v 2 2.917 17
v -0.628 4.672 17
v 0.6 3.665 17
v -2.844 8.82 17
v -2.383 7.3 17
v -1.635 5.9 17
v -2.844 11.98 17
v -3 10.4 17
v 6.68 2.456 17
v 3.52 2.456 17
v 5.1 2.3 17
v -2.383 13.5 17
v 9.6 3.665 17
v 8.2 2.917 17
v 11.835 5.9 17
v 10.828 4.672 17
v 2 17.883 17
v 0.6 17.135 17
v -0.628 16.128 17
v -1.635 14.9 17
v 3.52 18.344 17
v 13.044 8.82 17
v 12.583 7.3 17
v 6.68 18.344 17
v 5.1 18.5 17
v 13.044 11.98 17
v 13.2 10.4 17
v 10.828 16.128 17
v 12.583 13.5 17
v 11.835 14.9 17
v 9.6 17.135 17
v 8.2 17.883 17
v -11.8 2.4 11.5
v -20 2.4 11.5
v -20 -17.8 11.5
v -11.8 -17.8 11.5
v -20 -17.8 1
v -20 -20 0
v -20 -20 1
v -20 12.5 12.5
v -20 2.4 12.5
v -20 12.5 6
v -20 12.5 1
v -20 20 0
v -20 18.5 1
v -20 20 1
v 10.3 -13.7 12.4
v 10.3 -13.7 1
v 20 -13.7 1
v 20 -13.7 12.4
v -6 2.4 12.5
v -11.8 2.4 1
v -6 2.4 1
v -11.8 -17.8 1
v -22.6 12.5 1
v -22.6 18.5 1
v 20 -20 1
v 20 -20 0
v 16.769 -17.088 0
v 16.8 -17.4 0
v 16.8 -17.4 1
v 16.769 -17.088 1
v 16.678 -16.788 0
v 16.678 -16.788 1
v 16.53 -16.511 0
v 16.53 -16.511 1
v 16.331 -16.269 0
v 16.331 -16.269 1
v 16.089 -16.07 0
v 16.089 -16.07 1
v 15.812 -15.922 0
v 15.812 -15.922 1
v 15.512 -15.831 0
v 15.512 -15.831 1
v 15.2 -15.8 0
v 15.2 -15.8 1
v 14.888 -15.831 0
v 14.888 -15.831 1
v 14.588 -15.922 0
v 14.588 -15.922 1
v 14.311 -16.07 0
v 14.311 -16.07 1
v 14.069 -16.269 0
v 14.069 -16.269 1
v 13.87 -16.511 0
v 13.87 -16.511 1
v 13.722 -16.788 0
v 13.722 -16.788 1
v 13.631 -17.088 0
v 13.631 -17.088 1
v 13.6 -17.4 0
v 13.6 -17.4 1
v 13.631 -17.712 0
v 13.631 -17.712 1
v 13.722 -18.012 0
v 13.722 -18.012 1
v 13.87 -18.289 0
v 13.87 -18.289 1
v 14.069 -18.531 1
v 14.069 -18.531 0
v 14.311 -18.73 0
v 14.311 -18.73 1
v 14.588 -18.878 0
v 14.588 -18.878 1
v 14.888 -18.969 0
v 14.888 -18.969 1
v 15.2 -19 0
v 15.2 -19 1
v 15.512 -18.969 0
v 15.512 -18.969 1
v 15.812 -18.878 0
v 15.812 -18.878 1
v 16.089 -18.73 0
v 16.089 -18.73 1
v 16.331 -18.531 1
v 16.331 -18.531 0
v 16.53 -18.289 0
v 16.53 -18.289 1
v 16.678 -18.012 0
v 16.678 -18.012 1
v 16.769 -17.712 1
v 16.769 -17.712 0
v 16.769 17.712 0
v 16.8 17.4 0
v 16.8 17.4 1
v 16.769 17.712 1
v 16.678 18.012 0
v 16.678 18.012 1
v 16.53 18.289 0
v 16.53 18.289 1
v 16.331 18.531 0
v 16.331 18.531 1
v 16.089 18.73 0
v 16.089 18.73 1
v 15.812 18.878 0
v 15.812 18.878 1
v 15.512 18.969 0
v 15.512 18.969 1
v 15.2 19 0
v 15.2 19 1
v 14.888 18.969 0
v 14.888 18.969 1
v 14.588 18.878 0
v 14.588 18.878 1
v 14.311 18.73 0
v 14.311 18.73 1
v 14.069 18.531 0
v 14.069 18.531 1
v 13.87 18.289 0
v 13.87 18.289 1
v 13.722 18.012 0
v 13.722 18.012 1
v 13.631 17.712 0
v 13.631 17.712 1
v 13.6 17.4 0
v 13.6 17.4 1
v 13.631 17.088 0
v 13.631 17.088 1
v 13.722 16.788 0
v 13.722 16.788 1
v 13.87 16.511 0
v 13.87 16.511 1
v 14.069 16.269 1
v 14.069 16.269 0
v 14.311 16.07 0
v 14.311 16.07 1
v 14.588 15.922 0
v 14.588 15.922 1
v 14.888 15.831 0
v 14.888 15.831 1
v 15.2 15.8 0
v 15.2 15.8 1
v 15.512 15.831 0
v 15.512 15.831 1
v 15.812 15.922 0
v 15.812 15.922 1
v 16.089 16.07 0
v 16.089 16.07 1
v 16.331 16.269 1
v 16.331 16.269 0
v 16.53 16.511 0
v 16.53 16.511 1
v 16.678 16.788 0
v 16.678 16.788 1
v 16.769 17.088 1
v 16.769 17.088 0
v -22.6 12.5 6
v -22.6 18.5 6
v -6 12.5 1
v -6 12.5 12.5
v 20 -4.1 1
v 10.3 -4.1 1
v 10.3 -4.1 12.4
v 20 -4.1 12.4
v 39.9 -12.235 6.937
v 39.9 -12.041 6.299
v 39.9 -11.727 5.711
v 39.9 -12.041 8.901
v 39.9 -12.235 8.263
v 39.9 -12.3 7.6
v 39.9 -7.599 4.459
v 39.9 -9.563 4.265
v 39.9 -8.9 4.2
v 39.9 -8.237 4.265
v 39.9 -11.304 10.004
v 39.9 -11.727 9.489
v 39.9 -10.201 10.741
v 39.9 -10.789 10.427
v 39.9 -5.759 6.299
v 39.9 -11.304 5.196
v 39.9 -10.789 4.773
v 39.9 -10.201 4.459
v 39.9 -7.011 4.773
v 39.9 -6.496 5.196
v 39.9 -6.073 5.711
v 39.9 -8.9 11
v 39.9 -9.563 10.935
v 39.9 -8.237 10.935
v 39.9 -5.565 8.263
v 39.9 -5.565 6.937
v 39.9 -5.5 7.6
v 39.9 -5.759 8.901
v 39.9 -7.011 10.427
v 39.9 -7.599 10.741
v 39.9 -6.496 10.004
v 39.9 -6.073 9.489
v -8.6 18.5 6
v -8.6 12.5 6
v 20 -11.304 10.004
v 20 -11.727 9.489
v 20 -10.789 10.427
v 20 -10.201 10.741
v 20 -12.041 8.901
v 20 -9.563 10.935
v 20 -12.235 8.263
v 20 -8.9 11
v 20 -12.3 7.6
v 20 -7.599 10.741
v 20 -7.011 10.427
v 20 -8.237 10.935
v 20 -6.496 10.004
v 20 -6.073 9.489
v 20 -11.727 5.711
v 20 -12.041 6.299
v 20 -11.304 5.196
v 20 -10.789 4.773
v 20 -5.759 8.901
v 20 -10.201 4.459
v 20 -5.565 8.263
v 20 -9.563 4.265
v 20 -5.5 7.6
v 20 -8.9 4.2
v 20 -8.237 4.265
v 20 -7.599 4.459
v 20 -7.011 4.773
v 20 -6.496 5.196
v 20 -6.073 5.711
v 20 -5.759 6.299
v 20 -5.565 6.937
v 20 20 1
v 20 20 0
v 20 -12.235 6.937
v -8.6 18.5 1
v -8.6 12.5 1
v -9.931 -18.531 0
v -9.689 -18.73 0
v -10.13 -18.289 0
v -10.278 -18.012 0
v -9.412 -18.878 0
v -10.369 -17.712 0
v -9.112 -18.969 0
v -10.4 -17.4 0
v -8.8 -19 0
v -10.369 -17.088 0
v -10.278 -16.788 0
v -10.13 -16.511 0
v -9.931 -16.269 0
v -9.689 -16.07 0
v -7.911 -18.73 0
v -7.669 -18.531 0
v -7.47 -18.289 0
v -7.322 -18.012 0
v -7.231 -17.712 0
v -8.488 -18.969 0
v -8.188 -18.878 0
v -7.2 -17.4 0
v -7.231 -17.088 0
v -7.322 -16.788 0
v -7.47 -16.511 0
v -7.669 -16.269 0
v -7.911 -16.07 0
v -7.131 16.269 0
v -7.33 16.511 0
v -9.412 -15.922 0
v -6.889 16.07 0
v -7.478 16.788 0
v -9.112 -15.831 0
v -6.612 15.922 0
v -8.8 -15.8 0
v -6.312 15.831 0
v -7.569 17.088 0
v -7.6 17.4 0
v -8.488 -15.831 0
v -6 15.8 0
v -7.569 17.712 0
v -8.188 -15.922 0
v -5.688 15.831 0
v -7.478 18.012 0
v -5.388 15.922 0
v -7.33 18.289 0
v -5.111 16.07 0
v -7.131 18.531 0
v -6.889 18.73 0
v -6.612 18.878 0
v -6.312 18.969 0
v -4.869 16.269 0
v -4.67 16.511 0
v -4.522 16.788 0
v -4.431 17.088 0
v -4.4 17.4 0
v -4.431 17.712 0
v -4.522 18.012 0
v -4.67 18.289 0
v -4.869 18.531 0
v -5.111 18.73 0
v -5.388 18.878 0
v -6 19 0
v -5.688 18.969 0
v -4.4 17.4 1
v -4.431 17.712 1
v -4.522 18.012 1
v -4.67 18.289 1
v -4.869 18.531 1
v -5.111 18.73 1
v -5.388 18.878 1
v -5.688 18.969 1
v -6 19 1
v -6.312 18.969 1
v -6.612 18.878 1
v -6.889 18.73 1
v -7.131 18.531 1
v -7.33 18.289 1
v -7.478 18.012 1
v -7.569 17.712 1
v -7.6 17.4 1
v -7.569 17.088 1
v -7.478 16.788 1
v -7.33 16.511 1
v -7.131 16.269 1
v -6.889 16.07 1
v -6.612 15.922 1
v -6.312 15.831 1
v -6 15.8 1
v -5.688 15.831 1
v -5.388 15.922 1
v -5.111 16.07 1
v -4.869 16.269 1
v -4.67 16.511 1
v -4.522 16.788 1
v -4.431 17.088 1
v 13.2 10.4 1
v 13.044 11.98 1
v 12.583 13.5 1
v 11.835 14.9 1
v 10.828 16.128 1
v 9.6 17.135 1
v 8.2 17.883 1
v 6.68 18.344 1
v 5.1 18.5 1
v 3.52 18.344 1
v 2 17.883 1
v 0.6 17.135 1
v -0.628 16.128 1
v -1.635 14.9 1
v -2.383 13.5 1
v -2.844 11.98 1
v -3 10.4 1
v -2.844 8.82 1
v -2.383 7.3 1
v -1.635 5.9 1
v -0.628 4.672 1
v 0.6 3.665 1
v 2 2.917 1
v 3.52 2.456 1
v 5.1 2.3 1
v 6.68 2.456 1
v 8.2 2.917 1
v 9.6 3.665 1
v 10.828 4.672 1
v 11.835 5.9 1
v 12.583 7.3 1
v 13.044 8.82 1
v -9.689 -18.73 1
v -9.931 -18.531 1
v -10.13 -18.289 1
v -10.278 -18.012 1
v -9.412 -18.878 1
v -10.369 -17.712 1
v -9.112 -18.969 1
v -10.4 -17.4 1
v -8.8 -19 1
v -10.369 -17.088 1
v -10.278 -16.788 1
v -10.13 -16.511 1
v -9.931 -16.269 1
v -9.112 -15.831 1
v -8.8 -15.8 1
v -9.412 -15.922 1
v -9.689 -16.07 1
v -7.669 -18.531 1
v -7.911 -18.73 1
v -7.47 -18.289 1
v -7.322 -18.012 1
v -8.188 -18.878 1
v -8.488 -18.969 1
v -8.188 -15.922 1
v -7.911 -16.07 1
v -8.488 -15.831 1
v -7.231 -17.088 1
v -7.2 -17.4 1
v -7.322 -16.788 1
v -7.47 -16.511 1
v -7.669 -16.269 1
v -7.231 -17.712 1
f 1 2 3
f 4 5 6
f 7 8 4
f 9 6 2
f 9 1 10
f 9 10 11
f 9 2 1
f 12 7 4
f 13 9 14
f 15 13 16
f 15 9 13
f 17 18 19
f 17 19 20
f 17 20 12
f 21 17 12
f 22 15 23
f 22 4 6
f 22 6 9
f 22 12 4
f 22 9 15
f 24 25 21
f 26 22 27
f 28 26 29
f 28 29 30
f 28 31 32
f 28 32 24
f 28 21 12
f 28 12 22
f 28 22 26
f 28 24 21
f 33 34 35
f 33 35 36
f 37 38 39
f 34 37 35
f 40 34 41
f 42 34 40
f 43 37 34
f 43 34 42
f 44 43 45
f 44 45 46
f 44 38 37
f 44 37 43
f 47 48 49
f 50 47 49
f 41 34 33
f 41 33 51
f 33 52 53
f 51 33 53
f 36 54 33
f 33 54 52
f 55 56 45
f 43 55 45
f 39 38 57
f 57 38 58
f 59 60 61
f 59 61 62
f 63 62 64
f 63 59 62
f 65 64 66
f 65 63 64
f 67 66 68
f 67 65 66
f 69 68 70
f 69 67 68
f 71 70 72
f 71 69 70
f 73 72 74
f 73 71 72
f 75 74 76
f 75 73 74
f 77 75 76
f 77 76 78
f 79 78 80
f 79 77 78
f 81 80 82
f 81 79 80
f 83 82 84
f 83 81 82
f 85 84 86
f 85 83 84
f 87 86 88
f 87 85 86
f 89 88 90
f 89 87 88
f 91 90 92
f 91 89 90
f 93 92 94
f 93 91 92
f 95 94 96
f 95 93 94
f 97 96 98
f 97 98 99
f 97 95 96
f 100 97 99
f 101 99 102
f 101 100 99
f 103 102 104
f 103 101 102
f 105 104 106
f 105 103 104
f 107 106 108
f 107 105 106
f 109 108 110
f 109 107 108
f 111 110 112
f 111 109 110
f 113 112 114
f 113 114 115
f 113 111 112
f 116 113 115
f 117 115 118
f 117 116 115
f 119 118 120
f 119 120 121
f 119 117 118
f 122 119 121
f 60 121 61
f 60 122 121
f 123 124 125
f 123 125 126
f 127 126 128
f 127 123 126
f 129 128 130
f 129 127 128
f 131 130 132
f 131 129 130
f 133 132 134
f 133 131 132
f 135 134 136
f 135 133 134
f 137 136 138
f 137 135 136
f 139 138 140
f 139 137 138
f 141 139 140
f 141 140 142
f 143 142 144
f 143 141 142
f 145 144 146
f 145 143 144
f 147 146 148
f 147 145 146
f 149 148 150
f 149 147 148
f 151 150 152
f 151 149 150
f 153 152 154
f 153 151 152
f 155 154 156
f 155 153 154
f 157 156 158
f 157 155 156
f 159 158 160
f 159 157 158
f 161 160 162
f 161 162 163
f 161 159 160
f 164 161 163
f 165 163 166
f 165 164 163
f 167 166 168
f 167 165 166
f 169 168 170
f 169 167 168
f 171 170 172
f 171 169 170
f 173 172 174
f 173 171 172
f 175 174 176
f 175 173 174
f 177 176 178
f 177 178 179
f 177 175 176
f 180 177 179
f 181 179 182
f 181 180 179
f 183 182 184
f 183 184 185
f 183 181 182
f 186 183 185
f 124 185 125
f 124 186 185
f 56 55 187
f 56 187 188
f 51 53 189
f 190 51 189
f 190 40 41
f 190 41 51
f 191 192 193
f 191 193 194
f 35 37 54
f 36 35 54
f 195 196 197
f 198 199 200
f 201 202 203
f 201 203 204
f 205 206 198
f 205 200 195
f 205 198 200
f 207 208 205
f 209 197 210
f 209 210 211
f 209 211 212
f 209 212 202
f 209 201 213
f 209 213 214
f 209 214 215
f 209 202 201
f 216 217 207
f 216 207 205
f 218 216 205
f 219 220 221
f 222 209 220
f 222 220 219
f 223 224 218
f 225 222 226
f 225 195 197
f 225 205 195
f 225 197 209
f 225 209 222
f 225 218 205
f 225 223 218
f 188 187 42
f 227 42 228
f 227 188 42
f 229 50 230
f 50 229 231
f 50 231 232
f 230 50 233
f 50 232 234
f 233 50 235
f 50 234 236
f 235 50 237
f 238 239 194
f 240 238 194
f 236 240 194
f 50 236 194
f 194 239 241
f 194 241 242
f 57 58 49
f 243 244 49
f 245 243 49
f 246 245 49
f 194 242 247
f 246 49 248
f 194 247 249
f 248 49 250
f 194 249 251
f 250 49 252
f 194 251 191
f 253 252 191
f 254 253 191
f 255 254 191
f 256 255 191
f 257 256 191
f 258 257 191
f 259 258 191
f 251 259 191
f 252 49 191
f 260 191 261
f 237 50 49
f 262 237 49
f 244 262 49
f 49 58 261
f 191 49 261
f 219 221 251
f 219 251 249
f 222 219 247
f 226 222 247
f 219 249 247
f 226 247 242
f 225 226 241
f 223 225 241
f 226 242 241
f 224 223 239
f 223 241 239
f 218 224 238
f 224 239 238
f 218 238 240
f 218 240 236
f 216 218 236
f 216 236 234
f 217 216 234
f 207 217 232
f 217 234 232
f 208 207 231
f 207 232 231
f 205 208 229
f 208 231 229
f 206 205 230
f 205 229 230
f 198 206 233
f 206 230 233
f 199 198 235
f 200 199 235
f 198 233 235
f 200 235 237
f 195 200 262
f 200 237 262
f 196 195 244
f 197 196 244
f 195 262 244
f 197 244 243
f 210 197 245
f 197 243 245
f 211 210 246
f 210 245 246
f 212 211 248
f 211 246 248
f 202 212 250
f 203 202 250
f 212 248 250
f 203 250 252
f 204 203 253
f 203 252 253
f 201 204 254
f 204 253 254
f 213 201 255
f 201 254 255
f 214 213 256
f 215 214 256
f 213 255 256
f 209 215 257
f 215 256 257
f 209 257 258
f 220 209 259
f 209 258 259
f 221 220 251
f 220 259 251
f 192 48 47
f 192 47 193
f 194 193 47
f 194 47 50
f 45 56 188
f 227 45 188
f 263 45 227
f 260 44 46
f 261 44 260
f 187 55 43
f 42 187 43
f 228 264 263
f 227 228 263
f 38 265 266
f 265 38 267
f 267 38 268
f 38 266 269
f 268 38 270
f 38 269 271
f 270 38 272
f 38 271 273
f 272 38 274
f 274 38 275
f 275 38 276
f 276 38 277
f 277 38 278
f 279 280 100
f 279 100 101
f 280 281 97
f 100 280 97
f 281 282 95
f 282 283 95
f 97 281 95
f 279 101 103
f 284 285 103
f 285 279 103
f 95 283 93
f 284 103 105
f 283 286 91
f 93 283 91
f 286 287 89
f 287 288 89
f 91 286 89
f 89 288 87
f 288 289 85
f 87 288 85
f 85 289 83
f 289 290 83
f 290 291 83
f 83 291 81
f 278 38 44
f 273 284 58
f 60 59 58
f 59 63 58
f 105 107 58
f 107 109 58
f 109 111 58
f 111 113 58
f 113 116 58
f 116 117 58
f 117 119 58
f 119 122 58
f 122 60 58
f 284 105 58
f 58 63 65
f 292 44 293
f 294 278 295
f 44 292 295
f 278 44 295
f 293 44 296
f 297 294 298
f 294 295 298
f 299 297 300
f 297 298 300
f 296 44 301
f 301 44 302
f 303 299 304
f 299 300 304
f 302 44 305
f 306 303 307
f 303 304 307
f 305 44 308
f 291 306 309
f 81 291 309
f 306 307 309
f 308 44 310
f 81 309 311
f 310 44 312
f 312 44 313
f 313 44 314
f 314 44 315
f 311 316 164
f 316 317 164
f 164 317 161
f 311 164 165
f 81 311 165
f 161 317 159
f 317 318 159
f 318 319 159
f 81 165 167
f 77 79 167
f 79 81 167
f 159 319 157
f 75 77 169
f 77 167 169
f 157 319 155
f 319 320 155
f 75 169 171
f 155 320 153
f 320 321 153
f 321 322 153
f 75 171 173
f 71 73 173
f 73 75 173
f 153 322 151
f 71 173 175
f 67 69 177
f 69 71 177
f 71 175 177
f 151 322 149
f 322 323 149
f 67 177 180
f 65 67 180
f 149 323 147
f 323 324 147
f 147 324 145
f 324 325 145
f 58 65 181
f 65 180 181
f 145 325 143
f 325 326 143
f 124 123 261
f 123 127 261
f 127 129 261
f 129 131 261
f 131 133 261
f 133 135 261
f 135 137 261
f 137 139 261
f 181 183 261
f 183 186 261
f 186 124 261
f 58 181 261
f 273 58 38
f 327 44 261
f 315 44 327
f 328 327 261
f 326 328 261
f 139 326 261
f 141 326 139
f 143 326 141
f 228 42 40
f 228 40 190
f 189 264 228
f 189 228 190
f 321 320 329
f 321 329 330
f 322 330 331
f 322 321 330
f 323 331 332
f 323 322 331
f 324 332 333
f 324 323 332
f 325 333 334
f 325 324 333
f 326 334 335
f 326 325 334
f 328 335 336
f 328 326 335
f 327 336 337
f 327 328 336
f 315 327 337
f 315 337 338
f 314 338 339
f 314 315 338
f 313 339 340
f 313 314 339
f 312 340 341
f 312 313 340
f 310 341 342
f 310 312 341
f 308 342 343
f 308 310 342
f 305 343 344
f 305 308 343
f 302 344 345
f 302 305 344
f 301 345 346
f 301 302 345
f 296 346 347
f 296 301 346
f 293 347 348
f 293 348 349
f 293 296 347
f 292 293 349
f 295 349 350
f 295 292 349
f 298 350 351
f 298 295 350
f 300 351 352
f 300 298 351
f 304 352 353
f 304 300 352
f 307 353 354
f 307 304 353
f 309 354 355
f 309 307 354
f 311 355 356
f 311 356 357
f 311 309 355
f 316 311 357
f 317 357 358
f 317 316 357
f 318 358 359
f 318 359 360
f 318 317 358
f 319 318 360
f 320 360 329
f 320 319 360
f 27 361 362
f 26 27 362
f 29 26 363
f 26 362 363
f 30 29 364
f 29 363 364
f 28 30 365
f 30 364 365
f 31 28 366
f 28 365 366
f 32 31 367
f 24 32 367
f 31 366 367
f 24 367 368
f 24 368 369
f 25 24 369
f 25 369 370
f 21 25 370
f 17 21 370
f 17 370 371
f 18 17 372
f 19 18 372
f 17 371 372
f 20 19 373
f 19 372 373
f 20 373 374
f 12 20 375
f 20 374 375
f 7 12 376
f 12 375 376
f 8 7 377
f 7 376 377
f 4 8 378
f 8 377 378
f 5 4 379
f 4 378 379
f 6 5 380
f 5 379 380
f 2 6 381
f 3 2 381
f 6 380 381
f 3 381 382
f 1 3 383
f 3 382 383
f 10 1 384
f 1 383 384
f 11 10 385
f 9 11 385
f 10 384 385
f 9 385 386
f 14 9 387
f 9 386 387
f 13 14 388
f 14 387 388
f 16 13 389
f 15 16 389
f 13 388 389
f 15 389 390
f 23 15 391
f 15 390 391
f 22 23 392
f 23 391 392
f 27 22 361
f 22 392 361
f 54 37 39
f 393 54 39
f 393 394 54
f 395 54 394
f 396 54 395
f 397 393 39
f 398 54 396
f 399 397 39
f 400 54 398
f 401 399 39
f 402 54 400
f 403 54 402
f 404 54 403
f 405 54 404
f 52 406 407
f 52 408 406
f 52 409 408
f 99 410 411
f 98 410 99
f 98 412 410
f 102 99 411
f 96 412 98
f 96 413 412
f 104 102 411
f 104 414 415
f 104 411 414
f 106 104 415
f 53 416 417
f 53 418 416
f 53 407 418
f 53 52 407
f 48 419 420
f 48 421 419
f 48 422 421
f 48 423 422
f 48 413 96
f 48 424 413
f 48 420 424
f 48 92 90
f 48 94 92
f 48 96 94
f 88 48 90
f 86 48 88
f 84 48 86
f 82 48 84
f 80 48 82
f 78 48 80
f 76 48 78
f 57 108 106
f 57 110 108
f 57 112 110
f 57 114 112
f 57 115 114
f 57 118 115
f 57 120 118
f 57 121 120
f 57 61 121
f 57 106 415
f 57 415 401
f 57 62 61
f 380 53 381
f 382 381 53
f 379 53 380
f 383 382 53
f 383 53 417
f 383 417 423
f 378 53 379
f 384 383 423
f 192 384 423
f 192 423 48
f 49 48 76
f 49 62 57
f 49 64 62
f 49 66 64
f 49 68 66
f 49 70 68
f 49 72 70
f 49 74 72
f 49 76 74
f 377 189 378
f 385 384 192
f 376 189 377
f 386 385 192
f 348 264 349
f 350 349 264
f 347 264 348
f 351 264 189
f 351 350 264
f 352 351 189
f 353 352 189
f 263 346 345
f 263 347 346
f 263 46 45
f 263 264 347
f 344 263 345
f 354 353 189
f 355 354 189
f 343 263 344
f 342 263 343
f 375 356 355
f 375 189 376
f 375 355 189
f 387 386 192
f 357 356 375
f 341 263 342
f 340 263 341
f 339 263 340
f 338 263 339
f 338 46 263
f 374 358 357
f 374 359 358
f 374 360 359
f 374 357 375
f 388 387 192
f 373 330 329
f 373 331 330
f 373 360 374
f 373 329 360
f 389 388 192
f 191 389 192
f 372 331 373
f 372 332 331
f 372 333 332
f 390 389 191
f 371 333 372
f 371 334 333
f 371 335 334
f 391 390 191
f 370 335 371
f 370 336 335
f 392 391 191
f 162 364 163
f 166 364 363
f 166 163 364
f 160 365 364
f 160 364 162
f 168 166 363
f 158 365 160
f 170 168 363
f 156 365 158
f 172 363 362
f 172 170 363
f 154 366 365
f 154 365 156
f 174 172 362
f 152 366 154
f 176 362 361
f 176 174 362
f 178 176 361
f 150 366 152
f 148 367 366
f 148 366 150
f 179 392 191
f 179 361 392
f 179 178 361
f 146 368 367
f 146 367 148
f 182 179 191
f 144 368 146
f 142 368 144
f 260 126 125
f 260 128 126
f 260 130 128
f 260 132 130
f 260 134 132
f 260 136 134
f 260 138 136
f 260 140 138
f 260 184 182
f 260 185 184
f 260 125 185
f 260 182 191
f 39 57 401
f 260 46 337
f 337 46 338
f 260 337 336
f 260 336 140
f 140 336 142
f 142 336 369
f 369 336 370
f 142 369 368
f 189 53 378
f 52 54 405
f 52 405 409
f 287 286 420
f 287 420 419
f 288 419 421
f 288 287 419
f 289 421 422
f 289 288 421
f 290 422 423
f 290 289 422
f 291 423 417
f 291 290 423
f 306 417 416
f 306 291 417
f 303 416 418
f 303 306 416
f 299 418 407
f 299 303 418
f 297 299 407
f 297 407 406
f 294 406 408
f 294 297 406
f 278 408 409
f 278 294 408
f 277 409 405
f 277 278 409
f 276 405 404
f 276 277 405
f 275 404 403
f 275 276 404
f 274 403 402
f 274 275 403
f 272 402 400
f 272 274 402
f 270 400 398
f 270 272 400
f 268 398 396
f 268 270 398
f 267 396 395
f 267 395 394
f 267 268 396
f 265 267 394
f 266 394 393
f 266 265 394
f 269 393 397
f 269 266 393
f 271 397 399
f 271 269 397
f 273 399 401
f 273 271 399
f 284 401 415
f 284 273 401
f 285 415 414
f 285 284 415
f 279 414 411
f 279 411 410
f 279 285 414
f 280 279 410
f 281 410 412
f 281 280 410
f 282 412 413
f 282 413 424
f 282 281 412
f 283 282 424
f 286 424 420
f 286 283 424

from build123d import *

# Parameters (mm, degrees)
F0_W      = 40
F0_H      = 40
F0_R      = 1.6
F1_DEPTH  = 1
F2_W      = 9.7
F2_H      = 9.6
F3_DEPTH  = 11.4
F4_R      = 3.4
F5_DEPTH  = 19.9
F6_R      = 8.1
F7_DEPTH  = 16
F8_W      = 14
F8_H      = 6
F9_DEPTH  = 5
F10_W     = 8.2
F10_H     = 20.2
F11_DEPTH = 10.5
F12_W     = 14
F12_H     = 10.1
F13_DEPTH = 11.5


with BuildPart() as f1:
    # F0 (on Top) → F1 (new body)
    with BuildSketch(Plane.XY):
        Rectangle(F0_W, F0_H)
        with Locations((-8.8, -17.4)):
            Circle(F0_R, mode=Mode.SUBTRACT)
        with Locations((15.2, -17.4)):
            Circle(F0_R, mode=Mode.SUBTRACT)
        with Locations((-6, 17.4)):
            Circle(F0_R, mode=Mode.SUBTRACT)
        with Locations((15.2, 17.4)):
            Circle(F0_R, mode=Mode.SUBTRACT)
    extrude(amount=F1_DEPTH)

    # F2 (on face) → F3 (join)
    with BuildSketch(Plane.XY.offset(1)):
        with Locations((15.15, -8.9)):
            Rectangle(F2_W, F2_H)
    extrude(amount=F3_DEPTH)

    # F4 (on face) → F5 (join)
    with BuildSketch(Plane.YZ.offset(20)):
        with Locations((-8.9, 7.6)):
            Circle(F4_R)
    extrude(amount=F5_DEPTH)

    # F6 (on face) → F7 (join)
    with BuildSketch(Plane.XY.offset(1)):
        with Locations((5.1, 10.4)):
            Circle(F6_R)
    extrude(amount=F7_DEPTH)

    # F8 (on face) → F9 (join)
    with BuildSketch(Plane.XY.offset(1)):
        with Locations((-15.6, 15.5)):
            Rectangle(F8_W, F8_H)
    extrude(amount=F9_DEPTH)

    # F10 (on face) → F11 (join)
    with BuildSketch(Plane.XY.offset(1)):
        with Locations((-15.9, -7.7)):
            Rectangle(F10_W, F10_H)
    extrude(amount=F11_DEPTH)

    # F12 (on face) → F13 (join)
    with BuildSketch(Plane.XY.offset(1)):
        with Locations((-13, 7.45)):
            Rectangle(F12_W, F12_H)
    extrude(amount=F13_DEPTH)


solid = f1.part
